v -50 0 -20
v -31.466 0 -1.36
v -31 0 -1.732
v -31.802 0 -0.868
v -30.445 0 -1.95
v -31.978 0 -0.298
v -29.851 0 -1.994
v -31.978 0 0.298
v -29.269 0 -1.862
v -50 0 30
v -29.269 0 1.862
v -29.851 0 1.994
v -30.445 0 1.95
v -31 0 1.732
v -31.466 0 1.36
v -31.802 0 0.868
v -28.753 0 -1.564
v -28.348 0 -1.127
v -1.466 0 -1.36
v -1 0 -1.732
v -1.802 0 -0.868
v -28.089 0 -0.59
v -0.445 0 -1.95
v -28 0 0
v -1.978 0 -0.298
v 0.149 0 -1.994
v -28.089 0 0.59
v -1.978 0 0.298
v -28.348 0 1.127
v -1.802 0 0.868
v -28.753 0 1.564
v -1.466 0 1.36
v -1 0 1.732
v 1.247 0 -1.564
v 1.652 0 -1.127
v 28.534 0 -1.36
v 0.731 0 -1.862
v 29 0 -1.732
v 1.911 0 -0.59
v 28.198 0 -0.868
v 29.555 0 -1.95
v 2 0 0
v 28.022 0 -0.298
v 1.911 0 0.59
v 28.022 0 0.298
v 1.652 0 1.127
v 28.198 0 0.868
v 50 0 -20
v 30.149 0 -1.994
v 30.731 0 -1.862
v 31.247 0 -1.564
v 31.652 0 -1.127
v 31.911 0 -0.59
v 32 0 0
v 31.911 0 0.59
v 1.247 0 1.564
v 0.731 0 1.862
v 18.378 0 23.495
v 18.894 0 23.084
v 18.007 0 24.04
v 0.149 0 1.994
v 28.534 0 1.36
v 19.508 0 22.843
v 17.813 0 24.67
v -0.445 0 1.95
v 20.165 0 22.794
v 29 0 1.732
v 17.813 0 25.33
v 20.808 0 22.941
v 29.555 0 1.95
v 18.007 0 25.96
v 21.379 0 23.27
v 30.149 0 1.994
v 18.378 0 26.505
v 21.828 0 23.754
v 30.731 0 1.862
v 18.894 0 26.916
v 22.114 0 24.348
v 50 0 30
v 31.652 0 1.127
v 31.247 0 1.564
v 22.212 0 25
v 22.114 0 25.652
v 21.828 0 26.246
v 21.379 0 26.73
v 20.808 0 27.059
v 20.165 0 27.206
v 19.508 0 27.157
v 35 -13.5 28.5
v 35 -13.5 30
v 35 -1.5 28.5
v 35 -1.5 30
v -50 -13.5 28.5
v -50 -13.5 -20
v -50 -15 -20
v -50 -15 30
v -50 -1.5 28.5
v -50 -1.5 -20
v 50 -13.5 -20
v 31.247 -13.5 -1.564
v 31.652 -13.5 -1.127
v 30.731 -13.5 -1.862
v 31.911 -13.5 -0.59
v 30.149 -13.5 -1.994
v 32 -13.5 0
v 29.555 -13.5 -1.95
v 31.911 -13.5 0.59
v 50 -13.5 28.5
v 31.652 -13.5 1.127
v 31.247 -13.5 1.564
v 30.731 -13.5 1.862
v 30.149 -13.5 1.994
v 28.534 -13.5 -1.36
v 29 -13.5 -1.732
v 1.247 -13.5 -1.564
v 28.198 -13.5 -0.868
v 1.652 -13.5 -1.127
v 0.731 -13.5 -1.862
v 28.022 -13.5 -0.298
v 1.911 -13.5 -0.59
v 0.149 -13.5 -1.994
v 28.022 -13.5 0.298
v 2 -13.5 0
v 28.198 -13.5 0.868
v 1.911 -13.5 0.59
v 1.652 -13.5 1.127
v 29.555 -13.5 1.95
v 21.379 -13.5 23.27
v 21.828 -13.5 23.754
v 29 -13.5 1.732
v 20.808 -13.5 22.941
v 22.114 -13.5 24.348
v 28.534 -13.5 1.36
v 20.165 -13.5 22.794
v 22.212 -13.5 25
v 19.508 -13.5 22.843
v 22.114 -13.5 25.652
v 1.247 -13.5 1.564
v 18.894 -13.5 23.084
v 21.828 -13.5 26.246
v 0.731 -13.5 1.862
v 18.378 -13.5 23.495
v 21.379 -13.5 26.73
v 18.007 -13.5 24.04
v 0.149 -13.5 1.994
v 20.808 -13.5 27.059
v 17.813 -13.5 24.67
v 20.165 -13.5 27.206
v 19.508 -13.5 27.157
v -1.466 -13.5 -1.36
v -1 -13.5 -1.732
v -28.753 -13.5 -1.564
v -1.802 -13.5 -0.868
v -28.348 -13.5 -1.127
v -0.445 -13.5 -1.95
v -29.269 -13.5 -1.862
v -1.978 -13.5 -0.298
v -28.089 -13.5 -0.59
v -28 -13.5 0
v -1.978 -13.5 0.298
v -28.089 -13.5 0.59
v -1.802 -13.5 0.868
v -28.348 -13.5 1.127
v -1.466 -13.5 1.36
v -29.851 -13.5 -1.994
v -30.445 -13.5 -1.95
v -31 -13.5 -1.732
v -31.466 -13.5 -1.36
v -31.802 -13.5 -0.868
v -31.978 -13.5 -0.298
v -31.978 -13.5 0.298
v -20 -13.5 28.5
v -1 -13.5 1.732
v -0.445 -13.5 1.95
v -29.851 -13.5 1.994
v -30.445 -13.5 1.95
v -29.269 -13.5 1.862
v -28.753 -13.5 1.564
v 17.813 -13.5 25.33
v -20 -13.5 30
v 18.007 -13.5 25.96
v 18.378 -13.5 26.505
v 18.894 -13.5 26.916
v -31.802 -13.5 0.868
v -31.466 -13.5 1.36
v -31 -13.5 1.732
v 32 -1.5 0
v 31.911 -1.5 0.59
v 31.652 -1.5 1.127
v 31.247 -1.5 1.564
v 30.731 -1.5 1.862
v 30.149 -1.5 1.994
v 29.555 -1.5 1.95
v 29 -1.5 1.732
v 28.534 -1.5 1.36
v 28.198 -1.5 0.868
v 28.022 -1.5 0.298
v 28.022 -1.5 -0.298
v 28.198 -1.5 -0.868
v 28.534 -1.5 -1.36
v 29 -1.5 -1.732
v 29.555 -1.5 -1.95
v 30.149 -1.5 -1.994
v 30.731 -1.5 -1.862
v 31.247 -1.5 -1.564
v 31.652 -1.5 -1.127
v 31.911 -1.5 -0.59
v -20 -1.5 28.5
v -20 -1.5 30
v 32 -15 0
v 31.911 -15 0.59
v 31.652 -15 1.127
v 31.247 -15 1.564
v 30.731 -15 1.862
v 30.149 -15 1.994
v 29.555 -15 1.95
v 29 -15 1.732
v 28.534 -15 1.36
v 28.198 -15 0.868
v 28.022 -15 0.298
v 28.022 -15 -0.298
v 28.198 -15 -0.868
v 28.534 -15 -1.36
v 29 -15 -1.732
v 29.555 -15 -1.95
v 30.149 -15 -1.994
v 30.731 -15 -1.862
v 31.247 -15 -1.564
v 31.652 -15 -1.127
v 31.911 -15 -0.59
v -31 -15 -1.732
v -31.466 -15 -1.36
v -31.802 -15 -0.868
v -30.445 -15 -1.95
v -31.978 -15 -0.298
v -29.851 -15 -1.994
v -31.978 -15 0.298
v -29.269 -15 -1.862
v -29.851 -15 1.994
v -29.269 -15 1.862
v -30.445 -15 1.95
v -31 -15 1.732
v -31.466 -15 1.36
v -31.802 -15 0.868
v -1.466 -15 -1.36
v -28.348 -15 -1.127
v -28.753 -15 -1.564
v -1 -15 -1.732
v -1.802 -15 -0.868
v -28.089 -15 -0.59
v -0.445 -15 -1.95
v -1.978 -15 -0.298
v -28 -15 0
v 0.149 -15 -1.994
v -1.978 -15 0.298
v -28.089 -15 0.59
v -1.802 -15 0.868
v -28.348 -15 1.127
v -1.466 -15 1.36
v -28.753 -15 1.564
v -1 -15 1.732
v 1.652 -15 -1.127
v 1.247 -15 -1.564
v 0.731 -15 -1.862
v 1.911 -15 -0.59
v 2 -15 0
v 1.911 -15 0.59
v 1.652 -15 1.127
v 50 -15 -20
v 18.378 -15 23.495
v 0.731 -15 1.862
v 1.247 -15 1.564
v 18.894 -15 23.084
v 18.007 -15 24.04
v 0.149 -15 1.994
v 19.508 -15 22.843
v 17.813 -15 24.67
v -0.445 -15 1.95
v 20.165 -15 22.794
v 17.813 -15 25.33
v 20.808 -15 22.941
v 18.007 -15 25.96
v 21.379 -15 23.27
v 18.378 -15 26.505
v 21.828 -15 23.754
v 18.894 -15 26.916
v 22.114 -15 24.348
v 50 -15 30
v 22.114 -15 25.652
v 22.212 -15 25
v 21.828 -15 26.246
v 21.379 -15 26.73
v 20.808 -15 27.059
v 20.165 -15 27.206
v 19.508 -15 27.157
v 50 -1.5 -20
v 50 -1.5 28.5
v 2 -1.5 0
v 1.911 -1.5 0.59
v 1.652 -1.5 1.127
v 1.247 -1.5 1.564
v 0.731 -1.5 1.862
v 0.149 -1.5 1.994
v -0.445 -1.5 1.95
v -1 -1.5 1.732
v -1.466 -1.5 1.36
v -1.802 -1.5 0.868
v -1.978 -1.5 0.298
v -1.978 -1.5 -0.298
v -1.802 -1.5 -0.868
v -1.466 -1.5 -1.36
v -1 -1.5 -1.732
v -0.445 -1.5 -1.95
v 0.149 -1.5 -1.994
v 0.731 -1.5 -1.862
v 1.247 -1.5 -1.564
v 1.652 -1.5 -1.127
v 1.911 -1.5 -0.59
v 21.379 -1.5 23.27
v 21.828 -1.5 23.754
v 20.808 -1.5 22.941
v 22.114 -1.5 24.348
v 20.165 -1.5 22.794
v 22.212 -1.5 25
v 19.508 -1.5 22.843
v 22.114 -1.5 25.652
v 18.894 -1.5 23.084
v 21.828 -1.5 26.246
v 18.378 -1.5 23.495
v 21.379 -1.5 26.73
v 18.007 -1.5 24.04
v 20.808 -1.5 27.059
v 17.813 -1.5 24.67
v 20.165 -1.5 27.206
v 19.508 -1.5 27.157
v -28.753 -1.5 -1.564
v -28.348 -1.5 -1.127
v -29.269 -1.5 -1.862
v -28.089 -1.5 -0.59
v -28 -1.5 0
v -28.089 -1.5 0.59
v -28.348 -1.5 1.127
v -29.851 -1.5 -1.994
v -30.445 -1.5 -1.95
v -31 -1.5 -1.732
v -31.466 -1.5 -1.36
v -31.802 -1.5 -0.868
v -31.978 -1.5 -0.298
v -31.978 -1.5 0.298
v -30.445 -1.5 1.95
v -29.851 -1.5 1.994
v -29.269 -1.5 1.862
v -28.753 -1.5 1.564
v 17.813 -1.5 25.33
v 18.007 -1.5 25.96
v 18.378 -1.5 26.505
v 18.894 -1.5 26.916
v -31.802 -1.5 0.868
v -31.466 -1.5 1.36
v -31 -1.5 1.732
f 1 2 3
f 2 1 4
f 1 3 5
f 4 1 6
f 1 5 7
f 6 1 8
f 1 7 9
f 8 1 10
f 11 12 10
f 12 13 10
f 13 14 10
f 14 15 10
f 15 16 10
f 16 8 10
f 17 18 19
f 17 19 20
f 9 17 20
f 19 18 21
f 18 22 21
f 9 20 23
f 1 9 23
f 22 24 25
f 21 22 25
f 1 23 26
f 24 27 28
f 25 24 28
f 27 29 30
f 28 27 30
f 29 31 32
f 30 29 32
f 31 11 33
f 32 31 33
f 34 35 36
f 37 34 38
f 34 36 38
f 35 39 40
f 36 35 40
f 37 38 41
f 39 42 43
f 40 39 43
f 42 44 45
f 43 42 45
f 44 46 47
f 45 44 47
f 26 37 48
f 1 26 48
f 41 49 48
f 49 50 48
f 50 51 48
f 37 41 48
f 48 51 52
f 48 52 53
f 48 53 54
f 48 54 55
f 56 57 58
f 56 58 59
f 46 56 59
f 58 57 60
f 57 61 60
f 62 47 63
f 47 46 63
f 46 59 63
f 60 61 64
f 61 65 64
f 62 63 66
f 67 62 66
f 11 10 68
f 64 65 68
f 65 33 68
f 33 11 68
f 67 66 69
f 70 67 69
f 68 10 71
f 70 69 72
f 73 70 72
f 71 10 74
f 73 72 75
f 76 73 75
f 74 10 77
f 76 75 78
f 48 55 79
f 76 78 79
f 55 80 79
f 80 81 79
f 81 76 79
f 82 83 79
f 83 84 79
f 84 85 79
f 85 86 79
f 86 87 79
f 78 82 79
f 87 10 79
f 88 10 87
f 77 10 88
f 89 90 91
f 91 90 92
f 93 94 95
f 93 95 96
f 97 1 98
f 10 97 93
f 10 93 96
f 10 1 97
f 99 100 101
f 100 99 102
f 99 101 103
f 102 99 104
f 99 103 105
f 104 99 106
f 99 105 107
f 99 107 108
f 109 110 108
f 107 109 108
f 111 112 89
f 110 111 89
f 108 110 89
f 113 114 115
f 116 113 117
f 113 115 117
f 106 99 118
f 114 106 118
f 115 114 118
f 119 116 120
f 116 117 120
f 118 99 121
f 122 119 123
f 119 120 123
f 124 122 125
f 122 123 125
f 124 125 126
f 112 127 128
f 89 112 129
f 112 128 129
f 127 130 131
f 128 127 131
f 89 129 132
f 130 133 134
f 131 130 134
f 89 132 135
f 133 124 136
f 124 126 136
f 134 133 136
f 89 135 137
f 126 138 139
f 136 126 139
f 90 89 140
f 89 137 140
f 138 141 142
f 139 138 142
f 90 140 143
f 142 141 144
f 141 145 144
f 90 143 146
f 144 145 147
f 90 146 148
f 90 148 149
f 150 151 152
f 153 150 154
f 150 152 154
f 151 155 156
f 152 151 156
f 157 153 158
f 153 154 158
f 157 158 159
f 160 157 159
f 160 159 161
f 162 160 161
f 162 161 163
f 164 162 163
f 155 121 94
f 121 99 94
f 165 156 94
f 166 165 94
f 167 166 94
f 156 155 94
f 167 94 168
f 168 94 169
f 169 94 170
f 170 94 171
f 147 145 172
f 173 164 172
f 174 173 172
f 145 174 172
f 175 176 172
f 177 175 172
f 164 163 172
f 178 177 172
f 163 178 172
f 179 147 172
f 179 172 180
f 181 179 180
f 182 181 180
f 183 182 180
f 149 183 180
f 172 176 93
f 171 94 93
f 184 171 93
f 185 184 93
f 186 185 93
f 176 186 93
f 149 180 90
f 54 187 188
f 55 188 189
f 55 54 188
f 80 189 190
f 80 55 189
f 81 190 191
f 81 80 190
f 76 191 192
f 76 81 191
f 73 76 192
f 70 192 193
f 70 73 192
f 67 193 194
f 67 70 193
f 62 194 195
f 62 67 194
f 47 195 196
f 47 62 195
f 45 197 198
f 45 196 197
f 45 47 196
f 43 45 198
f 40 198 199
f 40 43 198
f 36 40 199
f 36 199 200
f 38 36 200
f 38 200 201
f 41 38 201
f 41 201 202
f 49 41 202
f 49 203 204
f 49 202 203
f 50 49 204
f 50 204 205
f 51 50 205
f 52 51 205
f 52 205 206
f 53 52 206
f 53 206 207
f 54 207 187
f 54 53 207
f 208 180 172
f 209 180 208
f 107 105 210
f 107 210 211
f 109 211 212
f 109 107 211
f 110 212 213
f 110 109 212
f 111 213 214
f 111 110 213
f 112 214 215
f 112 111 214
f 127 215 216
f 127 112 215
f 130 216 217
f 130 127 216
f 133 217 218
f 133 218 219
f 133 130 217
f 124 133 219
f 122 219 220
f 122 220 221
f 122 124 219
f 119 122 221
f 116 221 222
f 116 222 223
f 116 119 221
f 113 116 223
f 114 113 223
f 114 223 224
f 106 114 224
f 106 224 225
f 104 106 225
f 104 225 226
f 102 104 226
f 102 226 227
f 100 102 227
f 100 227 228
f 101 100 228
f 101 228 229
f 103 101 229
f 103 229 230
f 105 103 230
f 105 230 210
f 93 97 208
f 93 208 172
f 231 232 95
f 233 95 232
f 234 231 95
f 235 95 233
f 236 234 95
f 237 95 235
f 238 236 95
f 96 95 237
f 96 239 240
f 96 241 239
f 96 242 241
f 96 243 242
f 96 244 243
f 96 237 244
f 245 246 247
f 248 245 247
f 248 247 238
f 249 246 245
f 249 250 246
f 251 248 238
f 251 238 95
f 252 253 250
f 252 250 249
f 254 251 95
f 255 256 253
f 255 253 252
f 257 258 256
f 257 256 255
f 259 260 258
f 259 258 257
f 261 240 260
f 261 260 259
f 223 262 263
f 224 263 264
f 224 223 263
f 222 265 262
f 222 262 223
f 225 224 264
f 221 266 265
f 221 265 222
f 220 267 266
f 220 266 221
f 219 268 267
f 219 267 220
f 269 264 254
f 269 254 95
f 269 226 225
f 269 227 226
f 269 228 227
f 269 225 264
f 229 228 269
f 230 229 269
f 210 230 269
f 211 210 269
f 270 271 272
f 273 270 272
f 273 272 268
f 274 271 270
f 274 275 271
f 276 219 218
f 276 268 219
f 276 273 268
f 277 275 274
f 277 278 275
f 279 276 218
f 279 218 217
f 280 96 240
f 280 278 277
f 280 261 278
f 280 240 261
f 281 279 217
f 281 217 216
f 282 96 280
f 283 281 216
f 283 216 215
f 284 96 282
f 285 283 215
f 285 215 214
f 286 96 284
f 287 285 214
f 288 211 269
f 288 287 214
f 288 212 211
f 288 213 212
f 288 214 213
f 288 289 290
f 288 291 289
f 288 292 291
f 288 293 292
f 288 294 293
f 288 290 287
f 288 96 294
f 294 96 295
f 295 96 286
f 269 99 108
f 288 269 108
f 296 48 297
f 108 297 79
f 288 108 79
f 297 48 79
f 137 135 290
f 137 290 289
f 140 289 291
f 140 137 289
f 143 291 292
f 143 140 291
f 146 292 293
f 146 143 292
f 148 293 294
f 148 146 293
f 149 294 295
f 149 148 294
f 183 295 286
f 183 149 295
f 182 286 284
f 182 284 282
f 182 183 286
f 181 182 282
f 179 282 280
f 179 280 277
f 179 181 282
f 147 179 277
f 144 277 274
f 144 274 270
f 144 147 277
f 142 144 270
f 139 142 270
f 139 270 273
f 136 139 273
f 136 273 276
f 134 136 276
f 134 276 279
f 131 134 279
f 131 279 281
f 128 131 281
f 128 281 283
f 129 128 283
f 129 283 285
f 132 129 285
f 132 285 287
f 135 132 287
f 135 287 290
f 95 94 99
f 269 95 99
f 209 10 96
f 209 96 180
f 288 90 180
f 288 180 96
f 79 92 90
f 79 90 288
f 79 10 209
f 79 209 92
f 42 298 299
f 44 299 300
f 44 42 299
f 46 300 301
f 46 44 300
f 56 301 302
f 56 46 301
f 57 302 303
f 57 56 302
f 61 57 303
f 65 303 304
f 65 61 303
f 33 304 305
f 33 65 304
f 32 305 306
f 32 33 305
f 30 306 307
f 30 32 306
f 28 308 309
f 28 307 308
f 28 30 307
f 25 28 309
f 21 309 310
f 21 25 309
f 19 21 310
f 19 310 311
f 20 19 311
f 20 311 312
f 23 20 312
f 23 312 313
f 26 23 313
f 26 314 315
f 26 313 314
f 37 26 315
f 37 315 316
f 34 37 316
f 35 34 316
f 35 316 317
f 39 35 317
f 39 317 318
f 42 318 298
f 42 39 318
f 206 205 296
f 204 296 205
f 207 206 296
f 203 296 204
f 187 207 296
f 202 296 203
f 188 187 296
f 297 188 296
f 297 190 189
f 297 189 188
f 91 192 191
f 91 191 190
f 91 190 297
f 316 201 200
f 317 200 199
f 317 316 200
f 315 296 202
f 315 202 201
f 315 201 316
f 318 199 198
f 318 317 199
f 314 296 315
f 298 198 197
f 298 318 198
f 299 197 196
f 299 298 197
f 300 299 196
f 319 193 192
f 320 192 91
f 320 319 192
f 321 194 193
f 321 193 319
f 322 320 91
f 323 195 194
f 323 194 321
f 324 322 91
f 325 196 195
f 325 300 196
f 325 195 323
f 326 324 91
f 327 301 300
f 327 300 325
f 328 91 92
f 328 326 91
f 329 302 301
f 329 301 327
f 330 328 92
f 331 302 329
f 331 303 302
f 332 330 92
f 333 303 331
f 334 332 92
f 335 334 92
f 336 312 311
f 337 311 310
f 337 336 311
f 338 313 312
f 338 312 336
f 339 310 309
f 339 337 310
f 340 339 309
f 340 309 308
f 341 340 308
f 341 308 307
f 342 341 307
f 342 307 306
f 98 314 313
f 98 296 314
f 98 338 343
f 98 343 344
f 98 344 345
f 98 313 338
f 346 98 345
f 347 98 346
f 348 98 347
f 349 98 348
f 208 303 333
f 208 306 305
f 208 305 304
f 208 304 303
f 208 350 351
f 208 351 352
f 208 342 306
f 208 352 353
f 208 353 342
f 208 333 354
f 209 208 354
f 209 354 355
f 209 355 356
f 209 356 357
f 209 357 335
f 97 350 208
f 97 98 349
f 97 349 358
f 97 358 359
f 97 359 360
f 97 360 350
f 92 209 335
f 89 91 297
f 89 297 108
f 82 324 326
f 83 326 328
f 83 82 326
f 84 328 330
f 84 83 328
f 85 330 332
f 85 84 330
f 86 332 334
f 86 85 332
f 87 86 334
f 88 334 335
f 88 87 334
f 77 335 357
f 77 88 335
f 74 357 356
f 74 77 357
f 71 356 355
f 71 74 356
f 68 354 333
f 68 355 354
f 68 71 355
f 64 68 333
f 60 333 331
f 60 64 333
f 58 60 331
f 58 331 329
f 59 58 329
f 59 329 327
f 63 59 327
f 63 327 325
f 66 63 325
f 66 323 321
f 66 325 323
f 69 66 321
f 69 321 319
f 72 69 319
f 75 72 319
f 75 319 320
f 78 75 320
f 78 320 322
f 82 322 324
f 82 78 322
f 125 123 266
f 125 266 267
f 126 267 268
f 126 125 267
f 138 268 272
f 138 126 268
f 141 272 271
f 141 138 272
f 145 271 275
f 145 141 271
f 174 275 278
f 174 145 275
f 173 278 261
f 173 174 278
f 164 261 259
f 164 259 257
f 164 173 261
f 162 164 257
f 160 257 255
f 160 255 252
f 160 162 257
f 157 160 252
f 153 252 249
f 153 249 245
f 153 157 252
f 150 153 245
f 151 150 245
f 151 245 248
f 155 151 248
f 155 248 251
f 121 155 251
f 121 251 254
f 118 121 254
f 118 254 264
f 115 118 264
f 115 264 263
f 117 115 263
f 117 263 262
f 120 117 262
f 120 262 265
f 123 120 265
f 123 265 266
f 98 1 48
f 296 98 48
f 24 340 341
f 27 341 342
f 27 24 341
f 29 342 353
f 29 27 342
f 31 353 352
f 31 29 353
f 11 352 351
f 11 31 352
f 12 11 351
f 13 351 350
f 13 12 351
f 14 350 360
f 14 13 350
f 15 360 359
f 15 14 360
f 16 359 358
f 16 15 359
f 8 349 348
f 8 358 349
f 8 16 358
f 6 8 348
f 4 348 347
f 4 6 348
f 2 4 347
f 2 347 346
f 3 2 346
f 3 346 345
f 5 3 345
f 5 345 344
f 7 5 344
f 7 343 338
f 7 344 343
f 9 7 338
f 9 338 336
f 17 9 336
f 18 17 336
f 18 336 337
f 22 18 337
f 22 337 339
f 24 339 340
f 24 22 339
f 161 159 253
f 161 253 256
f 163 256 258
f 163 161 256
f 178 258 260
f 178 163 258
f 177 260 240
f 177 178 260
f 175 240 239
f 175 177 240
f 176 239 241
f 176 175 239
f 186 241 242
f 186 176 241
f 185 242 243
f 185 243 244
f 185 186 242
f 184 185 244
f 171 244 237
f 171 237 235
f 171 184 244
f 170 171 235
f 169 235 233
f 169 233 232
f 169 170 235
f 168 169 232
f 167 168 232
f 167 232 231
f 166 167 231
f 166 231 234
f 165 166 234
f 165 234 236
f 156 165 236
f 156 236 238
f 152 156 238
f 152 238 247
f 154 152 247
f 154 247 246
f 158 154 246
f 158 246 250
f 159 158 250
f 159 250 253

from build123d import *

# Parameters (mm, degrees)
F0_W     = 100
F0_H     = 50
F0_R     = 2
F0_R_2   = 2.212138
F1_DEPTH = 15
F2_W     = 12
F2_H     = 48.5
F3_DEPTH = 100.001
F4_W     = 55
F4_H     = 12
F5_DEPTH = 25


with BuildPart() as f1:
    # F0 (on Front) → F1 (new body)
    with BuildSketch(Plane.XZ):
        with Locations((0, 5)):
            Rectangle(F0_W, F0_H)
        with Locations((-30, 0)):
            Circle(F0_R, mode=Mode.SUBTRACT)
        Circle(F0_R, mode=Mode.SUBTRACT)
        with Locations((30, 0)):
            Circle(F0_R, mode=Mode.SUBTRACT)
        with Locations((20, 25)):
            Circle(F0_R_2, mode=Mode.SUBTRACT)
    extrude(amount=F1_DEPTH)

    # F2 (on face) → F3 (cut, through all)
    with BuildSketch(Plane(origin=(-50, 0, 0), x_dir=(0, -1, 0), z_dir=(-1, 0, 0))):
        with Locations((7.5, 4.25)):
            Rectangle(F2_W, F2_H)
    extrude(amount=-F3_DEPTH, mode=Mode.SUBTRACT)

    # F4 (on face) → F5 (cut)
    with BuildSketch(Plane.XY.offset(30)):
        with Locations((7.5, -7.5)):
            Rectangle(F4_W, F4_H)
    extrude(amount=-F5_DEPTH, mode=Mode.SUBTRACT)


solid = f1.part
